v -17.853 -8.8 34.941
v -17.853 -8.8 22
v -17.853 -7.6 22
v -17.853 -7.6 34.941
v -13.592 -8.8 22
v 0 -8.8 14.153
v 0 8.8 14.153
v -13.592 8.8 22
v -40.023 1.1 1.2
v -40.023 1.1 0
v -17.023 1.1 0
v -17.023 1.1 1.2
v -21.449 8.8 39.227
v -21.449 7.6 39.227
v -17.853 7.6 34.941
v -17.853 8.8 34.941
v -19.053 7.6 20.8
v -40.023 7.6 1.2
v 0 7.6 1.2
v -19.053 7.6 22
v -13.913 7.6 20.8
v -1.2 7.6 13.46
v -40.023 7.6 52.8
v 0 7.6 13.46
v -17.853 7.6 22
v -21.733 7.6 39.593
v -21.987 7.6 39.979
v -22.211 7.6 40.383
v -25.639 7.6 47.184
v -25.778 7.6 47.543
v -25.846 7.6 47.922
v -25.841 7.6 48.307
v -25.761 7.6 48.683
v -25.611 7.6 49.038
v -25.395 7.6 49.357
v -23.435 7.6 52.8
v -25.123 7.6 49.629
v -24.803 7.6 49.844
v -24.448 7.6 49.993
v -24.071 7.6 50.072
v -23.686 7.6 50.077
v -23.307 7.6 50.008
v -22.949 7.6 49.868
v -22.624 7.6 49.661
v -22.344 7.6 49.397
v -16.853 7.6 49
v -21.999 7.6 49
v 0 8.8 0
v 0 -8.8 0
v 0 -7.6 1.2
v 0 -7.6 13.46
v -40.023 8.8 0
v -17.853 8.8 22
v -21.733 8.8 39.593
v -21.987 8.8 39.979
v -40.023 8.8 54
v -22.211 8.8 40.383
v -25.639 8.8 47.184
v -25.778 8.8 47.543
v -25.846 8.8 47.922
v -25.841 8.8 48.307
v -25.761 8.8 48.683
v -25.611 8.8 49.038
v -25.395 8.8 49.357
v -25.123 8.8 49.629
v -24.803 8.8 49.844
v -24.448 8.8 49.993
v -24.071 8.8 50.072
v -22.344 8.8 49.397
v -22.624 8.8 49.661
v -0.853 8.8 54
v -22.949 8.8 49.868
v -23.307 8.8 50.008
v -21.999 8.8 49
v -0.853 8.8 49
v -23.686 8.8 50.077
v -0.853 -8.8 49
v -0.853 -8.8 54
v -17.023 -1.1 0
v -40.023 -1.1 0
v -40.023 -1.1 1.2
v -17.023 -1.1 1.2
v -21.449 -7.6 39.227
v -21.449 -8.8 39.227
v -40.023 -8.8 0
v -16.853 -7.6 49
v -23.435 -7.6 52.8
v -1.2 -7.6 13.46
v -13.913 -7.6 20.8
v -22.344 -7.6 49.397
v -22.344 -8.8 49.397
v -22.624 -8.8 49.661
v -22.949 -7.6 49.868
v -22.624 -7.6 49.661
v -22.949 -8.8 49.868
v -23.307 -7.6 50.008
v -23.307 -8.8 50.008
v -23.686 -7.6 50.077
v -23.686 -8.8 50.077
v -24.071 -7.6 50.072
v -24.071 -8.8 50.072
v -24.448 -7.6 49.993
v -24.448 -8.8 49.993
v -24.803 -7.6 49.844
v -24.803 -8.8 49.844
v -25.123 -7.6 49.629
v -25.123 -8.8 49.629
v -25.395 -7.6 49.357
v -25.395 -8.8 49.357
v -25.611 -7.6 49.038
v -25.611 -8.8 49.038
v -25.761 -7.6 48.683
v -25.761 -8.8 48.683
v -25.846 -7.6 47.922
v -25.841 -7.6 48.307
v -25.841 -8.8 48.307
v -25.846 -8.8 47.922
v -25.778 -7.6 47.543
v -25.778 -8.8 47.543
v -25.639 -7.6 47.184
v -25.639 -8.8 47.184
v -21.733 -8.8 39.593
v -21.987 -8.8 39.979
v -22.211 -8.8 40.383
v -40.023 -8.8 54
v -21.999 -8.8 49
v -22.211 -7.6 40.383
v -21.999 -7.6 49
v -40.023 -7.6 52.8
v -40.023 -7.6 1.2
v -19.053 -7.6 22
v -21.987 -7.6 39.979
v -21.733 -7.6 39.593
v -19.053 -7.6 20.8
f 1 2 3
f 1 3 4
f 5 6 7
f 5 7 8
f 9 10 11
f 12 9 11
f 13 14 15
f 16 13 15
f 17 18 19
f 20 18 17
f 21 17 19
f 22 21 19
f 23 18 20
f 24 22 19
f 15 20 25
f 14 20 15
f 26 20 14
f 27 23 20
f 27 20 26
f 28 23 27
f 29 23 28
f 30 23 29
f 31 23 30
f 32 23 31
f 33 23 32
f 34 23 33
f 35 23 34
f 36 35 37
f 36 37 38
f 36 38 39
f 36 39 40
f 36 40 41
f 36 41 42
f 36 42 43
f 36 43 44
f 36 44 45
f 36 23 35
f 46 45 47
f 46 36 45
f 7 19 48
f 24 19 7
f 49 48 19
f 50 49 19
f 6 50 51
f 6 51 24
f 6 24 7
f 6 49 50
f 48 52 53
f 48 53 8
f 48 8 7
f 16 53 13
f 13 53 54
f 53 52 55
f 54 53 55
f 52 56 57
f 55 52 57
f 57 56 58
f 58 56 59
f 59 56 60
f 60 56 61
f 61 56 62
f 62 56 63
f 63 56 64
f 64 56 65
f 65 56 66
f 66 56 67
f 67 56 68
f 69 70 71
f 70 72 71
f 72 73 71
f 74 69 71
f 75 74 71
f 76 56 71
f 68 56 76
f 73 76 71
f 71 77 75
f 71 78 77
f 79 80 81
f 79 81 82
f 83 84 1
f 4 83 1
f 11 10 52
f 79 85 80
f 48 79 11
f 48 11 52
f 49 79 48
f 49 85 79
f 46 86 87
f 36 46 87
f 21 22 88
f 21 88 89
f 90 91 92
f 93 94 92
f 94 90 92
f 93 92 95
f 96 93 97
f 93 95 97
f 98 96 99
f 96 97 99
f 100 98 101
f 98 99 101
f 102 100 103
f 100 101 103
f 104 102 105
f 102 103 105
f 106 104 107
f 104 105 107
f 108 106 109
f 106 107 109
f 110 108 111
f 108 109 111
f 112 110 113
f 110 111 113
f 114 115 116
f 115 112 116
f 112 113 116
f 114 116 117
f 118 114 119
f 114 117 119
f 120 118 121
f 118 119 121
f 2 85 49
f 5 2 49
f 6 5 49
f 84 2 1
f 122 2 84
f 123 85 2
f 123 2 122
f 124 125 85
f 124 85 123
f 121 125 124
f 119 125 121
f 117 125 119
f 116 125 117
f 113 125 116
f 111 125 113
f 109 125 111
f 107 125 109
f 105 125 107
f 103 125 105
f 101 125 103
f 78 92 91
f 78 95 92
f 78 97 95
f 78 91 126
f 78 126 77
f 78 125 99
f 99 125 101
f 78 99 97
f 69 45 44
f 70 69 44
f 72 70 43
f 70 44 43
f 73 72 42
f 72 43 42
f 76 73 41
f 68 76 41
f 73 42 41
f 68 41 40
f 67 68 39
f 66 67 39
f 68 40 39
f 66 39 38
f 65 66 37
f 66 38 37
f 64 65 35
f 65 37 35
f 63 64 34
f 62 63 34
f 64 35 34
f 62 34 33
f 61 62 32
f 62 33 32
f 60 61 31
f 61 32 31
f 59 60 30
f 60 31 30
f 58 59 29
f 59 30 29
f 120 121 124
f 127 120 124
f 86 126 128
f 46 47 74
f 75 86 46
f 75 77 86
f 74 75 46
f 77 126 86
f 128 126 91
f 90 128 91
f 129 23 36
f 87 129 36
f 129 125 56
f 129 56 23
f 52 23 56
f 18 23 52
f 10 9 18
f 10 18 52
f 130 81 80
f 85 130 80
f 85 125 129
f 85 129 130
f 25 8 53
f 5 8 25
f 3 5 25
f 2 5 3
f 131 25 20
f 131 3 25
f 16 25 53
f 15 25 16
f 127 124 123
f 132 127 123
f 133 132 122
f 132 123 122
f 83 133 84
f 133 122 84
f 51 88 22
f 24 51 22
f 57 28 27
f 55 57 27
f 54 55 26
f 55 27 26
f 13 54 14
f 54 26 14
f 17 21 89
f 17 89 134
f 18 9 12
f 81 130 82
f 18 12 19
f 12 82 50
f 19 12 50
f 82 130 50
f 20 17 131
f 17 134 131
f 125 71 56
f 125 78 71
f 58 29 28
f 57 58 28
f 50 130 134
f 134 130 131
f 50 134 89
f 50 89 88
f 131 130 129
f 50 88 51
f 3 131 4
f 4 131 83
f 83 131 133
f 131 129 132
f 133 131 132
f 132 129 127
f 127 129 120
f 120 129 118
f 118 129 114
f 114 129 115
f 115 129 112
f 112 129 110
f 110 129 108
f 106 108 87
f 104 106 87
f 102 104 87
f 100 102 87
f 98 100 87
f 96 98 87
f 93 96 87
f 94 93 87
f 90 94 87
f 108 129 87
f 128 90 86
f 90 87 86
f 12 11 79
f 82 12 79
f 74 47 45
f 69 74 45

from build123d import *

# Parameters (mm, degrees)
F0_R         = 2.3
F1_DEPTH     = 8.8
F2_T         = -1.2
F3_DEPTH     = 1.2
F4_DEPTH     = 28.2
F5_DEPTH     = 1.2
F6_W         = 23
F6_H         = 2.2
F7_DEPTH     = 1.2
F9_DEPTH     = 17.6
F10_W        = 15.2
F10_H        = 3.8
F11_DEPTH    = 25
F12_T4_DEPTH = 15.2


# Not quite as in the source:
# - a fillet or chamfer that OpenCascade refuses, or shapes differently, is made with other operations: its cross-section is extruded or revolved along the edge and cut away or added
# - a feature names something its author has since deleted; it is built from what else it names


with BuildPart() as f1:
    # F0 (on Front) → F1 (new body, symmetric)
    with BuildSketch(Plane.XZ):
        Polygon((-40.0227420032, 54), (-40.0227420032, 0), (0, 0), (0, 14.1528282114), (-13.5917002335, 22), (-17.8529980872, 22), (-17.8529980872, 49), (-0.8529980872, 49), (-0.8529980872, 54), (-17.8529980872, 54), align=None)
        with Locations((-24.1529980872, 48.7)):
            Circle(F0_R, mode=Mode.SUBTRACT)
        with Locations((-24.1529980872, 48.7)):
            Circle(F0_R)
    extrude(amount=F1_DEPTH, both=True)

    # F2
    f2_openings = [f1.faces().sort_by_distance(p)[0] for p in [
        (-40.022742, 0, 27),
    ]]
    offset(amount=F2_T, openings=f2_openings, kind=Kind.INTERSECTION)

    # F3 (cut, through all): a face of the model
    f3_faces = [f1.faces().sort_by_distance(p)[0] for p in [
        (-2.0529980872, 0, 51.5),
    ]]
    extrude(f3_faces, amount=-F3_DEPTH, mode=Mode.SUBTRACT)

    # F4 (cut, through all): a face of the model
    f4_faces = [f1.faces().sort_by_distance(p)[0] for p in [
        (-9.9529980872, 0, 50.2),
    ]]
    extrude(f4_faces, amount=-F4_DEPTH, mode=Mode.SUBTRACT)

    # F5 (cut, through all): a face of the model
    f5_faces = [f1.faces().sort_by_distance(p)[0] for p in [
        (-1.2, 0, 7.3300039442),
    ]]
    extrude(f5_faces, amount=-F5_DEPTH, mode=Mode.SUBTRACT)

    # F6 (on face) → F7 (cut, through all)
    with BuildSketch(Plane(origin=(0, 0, 0), x_dir=(1, 0, 0), z_dir=(0, 0, -1))):
        with Locations((-28.5227420032, 0)):
            Rectangle(F6_W, F6_H)
    extrude(amount=-F7_DEPTH, mode=Mode.SUBTRACT)

    # F8 (on face) → F9 (cut, through all)
    with BuildSketch(Plane.XZ.offset(8.8)):
        with BuildLine():
            ThreePointArc((-22.2107439409, 40.3830760217), (-22.207256, 45.7916724587), (-17.8529980872, 49))
            Line((-17.8529980872, 49), (-21.9990858511, 49))
            Line((-21.9990858511, 49), (-22.3439980513, 49.3965202671))
            ThreePointArc((-22.3439980513, 49.3965202671), (-24.9680683048, 49.7442269385), (-25.6389133718, 47.1836388185))
            Line((-25.6389133718, 47.1836388185), (-22.2107439409, 40.3830760217))
        make_face()
        with BuildLine():
            Line((-17.8529980872, 34.9413308483), (-17.8529980872, 49))
            ThreePointArc((-17.8529980872, 49), (-22.207256, 45.7916724587), (-22.2107439409, 40.3830760217))
            ThreePointArc((-22.2107439409, 40.3830760217), (-21.8634478438, 39.783103161), (-21.4492647459, 39.2271945588))
            Line((-21.4492647459, 39.2271945588), (-17.8529980872, 34.9413308483))
        make_face()
    extrude(amount=-F9_DEPTH, mode=Mode.SUBTRACT)

    # F10 (on face) → F11 (join)
    with BuildSketch(Plane.YZ.offset(-0.8529980872)):
        with Locations((0, 50.9)):
            Rectangle(F10_W, F10_H)
    extrude(amount=-F11_DEPTH)

    # F12: chamfer of 9 x 5.1961524227 on 1 edges, made by hand


with BuildPart() as f12_tool2:
    # F12_s3 → F12_t4 (new body)
    with BuildSketch(Plane.XZ.offset(7.6)):
        Polygon((-16.8529980872, 49), (-25.8529980872, 54.1961524227), (-25.8529980872, 49), align=None)
    extrude(amount=-F12_T4_DEPTH)

    split(bisect_by=Plane.XY.offset(52.8), keep=Keep.BOTTOM)


with BuildPart() as f1_1:
    add(f1.part)

    # F12_t1: cut F12_tool2
    add(f12_tool2.part, mode=Mode.SUBTRACT)


solid = f1_1.part
